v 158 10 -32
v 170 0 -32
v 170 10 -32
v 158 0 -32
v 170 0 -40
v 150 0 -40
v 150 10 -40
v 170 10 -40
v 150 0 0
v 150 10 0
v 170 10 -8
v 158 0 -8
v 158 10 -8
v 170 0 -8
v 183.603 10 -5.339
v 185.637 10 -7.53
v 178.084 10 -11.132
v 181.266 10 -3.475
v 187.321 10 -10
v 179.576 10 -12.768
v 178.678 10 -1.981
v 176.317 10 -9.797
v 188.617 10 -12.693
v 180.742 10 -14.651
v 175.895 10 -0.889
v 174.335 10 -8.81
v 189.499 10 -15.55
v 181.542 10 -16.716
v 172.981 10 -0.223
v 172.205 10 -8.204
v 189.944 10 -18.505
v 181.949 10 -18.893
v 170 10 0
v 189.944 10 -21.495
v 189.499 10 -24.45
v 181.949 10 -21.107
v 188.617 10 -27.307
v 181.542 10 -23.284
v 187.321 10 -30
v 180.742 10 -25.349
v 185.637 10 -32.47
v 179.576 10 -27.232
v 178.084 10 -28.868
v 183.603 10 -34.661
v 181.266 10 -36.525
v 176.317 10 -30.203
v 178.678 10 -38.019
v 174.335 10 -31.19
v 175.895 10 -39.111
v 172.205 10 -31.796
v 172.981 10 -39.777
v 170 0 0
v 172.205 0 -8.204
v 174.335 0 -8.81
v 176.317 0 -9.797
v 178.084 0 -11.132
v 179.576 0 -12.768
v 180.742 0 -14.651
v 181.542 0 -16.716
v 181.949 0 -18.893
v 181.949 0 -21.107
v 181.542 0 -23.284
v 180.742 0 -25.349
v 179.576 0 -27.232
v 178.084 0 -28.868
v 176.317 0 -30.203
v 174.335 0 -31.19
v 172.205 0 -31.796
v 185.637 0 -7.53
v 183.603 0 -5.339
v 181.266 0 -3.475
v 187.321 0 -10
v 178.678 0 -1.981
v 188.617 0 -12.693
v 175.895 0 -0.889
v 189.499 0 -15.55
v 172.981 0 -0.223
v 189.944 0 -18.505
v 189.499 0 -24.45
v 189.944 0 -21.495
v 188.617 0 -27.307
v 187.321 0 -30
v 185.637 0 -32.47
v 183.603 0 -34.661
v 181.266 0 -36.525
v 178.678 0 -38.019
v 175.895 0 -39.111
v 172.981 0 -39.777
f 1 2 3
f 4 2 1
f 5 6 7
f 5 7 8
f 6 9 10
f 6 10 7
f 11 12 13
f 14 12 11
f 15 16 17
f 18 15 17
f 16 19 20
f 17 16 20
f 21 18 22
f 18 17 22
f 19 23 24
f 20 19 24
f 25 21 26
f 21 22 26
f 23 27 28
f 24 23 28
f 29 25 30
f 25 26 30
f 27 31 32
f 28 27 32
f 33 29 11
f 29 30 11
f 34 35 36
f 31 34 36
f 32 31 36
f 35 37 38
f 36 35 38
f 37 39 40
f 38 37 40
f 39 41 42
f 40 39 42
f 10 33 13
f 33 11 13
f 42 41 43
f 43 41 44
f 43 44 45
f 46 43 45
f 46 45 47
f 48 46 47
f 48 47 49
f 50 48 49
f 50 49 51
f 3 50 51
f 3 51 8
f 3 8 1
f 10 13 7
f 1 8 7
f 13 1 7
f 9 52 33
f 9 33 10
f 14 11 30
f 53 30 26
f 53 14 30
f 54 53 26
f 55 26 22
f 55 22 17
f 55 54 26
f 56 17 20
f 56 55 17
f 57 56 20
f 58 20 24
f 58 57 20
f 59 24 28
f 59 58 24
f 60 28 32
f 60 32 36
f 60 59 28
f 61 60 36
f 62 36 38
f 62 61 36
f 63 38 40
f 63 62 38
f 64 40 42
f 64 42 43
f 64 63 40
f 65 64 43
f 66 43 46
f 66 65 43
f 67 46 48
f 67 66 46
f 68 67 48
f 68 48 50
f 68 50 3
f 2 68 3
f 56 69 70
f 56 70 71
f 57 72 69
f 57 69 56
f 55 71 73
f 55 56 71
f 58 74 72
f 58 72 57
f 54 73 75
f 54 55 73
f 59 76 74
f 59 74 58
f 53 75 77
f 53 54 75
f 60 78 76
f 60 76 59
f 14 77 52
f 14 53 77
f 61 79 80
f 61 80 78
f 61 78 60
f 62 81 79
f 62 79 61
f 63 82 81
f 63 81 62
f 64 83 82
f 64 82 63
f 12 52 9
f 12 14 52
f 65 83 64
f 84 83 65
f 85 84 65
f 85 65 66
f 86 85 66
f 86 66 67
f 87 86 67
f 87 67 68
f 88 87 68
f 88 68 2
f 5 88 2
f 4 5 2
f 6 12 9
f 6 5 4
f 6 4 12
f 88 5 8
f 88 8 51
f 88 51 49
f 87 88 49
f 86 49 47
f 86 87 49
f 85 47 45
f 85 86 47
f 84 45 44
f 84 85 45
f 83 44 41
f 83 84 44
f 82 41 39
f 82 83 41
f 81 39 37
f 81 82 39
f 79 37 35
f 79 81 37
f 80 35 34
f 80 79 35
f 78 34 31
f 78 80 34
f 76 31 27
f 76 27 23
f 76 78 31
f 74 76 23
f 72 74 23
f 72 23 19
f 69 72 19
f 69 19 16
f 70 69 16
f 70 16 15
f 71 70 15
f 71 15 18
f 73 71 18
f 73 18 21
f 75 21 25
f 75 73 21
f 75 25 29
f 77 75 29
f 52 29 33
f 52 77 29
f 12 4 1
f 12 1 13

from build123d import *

# Parameters (mm, degrees)
BOSS_EXTRUDE1_DEPTH = 10


with BuildPart() as part:
    # Sketch1 → Boss-Extrude1 (new body)
    with BuildSketch(Plane(origin=(0, 0, 0), x_dir=(1, 0, 0), z_dir=(0, 1, 0))):
        with BuildLine():
            Line((150, 0), (150, 40))
            Line((150, 40), (170, 40))
            ThreePointArc((170, 40), (190, 20), (170, 0))
            Line((170, 0), (150, 0))
        make_face()
        with BuildLine():
            Line((170, 32), (158, 32))
            Line((158, 32), (158, 8))
            Line((158, 8), (170, 8))
            ThreePointArc((170, 8), (182, 20), (170, 32))
        make_face(mode=Mode.SUBTRACT)
    extrude(amount=BOSS_EXTRUDE1_DEPTH)


solid = part.part
